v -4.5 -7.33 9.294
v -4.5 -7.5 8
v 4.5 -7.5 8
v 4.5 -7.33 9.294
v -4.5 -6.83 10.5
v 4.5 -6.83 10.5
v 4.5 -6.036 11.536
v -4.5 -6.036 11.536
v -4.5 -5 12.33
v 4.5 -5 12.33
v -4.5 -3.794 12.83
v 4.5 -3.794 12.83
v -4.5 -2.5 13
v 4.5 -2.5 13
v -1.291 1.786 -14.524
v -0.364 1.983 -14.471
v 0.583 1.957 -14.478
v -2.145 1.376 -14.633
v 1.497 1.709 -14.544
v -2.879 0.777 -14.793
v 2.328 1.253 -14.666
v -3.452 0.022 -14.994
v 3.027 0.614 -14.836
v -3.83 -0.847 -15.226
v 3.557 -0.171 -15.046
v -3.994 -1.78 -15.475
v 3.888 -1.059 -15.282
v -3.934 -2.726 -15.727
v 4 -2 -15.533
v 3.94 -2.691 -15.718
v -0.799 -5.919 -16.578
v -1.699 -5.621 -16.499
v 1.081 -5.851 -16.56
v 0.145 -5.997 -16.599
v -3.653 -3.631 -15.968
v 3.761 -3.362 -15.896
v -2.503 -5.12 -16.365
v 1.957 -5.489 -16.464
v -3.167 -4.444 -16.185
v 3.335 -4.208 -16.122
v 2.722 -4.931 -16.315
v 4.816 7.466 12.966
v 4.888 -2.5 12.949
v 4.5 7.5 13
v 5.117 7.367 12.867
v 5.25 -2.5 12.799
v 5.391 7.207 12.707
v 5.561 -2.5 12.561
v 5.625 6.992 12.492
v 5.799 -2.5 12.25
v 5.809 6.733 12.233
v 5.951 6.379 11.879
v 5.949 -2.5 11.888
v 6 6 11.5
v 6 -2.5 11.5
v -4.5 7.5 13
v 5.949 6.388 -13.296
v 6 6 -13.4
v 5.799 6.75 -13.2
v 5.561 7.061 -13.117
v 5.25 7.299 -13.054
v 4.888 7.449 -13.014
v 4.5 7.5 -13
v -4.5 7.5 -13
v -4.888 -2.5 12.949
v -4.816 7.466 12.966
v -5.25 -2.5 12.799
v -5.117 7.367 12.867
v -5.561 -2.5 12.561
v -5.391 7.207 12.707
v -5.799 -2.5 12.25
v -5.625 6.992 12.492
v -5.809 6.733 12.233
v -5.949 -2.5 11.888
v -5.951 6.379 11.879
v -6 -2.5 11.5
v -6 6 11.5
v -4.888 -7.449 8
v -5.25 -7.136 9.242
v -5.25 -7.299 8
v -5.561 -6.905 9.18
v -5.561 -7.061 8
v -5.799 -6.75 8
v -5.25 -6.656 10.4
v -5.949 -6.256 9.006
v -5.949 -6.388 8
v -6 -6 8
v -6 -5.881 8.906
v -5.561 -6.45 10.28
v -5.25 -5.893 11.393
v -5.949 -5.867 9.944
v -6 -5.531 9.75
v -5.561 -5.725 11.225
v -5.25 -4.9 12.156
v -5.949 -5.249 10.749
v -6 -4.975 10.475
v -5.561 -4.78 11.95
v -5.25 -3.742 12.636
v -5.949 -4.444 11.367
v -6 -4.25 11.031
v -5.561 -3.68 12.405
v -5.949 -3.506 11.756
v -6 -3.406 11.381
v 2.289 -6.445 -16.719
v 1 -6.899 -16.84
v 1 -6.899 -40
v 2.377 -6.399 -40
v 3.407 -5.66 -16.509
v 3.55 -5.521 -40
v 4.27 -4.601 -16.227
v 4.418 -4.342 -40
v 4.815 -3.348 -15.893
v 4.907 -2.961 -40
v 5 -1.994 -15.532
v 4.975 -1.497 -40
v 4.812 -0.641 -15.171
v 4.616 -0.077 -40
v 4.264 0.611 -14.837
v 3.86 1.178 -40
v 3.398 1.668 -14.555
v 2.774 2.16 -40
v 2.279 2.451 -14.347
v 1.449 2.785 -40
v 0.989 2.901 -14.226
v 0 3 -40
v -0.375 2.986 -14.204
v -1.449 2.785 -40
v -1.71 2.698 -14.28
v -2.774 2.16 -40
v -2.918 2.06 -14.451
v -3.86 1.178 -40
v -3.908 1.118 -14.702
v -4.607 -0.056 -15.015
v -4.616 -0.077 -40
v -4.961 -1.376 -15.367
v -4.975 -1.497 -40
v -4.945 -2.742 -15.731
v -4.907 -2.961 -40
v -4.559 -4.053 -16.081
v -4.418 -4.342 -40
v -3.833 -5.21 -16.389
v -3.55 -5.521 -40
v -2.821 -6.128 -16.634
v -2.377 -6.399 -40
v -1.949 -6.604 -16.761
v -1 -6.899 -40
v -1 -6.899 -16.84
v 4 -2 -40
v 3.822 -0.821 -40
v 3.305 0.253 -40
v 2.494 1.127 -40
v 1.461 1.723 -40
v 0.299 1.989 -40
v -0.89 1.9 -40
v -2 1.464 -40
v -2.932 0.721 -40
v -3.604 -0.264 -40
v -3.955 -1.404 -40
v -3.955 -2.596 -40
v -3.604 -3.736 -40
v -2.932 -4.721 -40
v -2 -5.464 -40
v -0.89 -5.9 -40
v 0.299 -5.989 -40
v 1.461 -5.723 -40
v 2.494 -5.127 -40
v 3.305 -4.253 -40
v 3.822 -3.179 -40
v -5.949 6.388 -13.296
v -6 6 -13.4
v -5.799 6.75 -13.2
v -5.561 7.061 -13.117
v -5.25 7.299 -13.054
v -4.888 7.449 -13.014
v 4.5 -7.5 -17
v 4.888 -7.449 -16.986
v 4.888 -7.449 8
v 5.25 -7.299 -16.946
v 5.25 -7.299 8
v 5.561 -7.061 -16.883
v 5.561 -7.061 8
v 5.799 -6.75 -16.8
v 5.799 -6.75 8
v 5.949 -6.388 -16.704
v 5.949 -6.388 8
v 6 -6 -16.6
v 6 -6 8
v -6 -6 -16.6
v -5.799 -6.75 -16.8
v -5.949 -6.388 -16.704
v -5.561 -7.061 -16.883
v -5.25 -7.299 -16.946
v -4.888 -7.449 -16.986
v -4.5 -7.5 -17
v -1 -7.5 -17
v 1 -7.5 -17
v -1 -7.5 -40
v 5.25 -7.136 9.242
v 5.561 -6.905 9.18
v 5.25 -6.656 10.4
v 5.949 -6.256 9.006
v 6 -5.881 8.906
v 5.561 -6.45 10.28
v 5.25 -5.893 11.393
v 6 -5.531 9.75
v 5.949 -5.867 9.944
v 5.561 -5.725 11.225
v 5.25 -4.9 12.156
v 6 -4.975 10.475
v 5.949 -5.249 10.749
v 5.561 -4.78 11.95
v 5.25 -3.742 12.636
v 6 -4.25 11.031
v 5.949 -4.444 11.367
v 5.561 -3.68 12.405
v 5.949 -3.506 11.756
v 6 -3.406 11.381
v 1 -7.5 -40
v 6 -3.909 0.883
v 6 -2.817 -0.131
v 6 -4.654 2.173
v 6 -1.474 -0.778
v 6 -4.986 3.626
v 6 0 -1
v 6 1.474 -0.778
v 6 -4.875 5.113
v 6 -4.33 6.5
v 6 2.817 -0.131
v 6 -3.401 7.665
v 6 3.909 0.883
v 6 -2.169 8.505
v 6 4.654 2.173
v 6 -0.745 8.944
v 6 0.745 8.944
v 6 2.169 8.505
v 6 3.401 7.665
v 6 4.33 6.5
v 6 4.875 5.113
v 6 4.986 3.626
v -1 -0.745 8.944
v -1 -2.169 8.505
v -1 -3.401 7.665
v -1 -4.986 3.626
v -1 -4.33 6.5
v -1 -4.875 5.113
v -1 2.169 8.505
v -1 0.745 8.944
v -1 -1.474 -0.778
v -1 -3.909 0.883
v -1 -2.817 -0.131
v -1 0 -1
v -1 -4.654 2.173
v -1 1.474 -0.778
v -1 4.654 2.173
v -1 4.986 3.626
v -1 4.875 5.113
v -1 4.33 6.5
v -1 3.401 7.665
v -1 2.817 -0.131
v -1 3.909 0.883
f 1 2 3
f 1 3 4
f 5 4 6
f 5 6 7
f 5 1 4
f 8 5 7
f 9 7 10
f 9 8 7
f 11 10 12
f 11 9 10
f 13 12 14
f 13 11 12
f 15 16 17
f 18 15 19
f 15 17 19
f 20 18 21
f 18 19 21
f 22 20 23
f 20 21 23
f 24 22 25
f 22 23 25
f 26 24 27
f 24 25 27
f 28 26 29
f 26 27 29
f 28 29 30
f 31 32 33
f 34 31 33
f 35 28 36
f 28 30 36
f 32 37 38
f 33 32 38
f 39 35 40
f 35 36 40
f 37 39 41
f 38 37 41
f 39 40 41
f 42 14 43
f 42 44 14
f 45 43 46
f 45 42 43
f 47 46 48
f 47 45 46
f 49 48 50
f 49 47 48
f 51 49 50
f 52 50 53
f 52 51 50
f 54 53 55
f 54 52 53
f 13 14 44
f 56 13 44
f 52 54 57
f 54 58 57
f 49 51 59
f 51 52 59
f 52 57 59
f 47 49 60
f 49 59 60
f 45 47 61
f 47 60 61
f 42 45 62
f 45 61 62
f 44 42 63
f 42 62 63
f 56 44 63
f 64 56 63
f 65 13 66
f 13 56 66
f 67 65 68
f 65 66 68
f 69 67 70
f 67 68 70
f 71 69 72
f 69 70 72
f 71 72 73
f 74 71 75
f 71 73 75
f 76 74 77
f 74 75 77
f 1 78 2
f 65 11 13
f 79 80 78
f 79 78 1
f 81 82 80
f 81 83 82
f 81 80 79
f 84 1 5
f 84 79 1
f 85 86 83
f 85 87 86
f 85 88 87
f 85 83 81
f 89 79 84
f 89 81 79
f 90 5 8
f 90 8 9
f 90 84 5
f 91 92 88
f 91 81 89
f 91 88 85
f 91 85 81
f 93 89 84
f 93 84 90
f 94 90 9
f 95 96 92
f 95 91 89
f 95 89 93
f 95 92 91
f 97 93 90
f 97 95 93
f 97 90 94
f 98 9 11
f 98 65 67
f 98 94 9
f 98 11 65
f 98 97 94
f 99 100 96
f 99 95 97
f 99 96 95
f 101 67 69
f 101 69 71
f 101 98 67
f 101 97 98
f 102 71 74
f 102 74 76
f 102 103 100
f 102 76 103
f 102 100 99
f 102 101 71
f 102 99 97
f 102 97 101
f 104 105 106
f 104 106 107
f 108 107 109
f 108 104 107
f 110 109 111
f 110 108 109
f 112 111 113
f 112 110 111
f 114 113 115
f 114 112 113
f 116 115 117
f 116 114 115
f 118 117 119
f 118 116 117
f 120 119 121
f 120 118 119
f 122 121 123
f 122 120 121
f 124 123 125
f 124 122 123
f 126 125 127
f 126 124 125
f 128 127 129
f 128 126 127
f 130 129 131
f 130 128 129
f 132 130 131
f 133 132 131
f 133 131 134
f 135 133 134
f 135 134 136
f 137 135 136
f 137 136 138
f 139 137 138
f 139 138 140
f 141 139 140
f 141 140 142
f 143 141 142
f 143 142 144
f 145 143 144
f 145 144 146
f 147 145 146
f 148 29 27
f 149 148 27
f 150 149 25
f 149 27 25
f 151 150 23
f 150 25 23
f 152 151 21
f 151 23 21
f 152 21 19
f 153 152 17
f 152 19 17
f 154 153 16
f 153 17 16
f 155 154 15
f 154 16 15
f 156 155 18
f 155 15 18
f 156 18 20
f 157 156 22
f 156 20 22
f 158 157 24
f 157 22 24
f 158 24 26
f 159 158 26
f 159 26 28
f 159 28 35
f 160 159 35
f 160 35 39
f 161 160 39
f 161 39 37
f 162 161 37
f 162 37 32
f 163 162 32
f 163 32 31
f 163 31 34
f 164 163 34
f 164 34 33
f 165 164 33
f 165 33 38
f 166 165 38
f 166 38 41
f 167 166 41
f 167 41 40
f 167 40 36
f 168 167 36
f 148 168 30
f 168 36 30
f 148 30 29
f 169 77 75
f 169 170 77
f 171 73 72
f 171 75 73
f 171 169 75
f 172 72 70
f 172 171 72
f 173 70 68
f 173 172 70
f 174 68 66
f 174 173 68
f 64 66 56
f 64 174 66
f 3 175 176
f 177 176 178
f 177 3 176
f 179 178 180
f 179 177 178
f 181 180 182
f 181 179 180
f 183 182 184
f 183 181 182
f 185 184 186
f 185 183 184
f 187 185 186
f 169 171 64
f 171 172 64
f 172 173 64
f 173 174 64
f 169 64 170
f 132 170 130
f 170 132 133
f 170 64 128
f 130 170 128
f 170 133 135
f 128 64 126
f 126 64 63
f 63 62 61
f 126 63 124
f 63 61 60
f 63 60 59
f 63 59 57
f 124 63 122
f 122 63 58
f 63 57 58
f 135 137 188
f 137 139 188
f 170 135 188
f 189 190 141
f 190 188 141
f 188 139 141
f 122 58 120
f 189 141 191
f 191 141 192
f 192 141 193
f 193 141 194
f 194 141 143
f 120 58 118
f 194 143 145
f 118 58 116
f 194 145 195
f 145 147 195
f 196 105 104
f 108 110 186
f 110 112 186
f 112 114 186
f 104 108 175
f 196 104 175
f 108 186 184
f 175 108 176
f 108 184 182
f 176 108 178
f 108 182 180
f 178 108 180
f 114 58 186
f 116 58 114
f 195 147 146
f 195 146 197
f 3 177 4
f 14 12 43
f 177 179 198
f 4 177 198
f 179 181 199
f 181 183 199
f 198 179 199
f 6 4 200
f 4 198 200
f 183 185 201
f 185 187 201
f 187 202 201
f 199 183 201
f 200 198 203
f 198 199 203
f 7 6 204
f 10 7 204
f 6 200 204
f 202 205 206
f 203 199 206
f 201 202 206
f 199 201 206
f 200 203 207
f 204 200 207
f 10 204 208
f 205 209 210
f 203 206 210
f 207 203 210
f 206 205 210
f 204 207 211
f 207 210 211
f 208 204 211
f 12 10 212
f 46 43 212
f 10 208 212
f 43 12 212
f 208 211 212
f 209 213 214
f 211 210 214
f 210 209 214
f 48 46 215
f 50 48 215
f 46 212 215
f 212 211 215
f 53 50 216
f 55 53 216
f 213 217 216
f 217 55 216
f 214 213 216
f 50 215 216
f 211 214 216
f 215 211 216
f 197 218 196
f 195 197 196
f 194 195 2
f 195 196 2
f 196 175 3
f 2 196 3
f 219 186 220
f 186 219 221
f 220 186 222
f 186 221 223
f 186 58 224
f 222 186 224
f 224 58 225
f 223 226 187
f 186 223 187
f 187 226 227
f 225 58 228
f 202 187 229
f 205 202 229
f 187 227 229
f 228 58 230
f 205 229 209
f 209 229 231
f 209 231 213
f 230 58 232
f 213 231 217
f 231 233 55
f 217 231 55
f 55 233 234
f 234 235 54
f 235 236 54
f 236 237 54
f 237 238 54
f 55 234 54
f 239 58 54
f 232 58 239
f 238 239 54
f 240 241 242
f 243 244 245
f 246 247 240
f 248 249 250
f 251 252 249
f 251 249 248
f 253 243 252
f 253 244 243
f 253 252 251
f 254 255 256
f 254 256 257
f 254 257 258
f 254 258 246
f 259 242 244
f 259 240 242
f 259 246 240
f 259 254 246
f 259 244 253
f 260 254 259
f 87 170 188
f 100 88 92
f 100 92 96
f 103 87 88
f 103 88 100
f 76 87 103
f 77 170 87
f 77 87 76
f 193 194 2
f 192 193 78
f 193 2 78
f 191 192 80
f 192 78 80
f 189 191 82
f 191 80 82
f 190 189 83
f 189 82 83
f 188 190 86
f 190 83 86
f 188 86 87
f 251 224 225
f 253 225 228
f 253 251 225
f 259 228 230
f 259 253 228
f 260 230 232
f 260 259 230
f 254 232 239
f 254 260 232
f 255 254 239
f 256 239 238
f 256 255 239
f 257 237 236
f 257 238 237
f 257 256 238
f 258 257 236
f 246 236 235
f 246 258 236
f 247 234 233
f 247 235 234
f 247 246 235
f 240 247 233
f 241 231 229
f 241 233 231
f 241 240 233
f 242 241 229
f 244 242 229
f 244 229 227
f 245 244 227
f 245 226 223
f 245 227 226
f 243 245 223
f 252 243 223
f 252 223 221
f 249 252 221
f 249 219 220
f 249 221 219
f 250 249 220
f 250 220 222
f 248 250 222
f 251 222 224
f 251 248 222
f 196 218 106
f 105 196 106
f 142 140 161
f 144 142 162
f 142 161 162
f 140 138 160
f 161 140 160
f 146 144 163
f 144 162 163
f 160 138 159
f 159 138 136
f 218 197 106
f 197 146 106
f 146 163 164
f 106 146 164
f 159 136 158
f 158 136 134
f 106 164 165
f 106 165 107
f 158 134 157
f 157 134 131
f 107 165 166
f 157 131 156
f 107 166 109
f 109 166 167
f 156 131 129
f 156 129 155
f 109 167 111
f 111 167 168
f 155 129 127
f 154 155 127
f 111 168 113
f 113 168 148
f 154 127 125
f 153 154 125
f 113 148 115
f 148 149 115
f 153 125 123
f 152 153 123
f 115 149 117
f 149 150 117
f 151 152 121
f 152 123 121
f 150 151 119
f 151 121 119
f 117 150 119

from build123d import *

# Parameters (mm, degrees)
BOSS_EXTRUDE1_DEPTH = 6
SKETCH2_R           = 4
BOSS_EXTRUDE2_DEPTH = 40
CUT_EXTRUDE1_START  = -1
SKETCH3_R           = 5
CUT_EXTRUDE1_DEPTH  = 8
FILLET1_R           = 5
FILLET2_R           = 1.5


with BuildPart() as part:
    # Sketch1 → Boss-Extrude1 (new body, symmetric)
    with BuildSketch(Plane(origin=(0, 0, 0), x_dir=(0, 0, -1), z_dir=(1, 0, 0))):
        Polygon((13, 7.5), (17, -7.5), (-13, -7.5), (-13, 7.5), align=None)
    extrude(amount=BOSS_EXTRUDE1_DEPTH, both=True)

    # Sketch2 → Boss-Extrude2 (add)
    with BuildSketch(Plane.XY):
        with BuildLine():
            Line((-1, -7.5), (1, -7.5))
            Line((1, -7.5), (1, -6.898979486))
            ThreePointArc((1, -6.898979486), (0, 3), (-1, -6.898979486))
            Line((-1, -6.898979486), (-1, -7.5))
        make_face()
        with Locations((0, -2)):
            Circle(SKETCH2_R, mode=Mode.SUBTRACT)
    extrude(amount=-BOSS_EXTRUDE2_DEPTH)

    # Sketch3 → Cut-Extrude1 (cut, through all)
    with BuildSketch(Plane(origin=(0, 0, 0), x_dir=(0, 0, -1), z_dir=(1, 0, 0)).offset(CUT_EXTRUDE1_START)):
        with Locations((-4, 0)):
            Circle(SKETCH3_R)
    extrude(amount=CUT_EXTRUDE1_DEPTH, mode=Mode.SUBTRACT)

    # Fillet1
    fillet1_edges = [part.edges().sort_by_distance(p)[0] for p in [
        (0, -7.5, 13),
    ]]
    fillet(fillet1_edges, radius=FILLET1_R)

    # Fillet2
    fillet2_edges = [part.edges().sort_by_distance(p)[0] for p in [
        (6, -7.5, -4.5),
        (-6, -7.5, -4.5),
        (-6, -6.035533906, 11.535533906),
        (6, -6.035533906, 11.535533906),
        (6, 7.5, 0),
        (-6, 2.5, 13),
        (-6, 7.5, 0),
        (6, 2.5, 13),
    ]]
    fillet(fillet2_edges, radius=FILLET2_R)


solid = part.part
